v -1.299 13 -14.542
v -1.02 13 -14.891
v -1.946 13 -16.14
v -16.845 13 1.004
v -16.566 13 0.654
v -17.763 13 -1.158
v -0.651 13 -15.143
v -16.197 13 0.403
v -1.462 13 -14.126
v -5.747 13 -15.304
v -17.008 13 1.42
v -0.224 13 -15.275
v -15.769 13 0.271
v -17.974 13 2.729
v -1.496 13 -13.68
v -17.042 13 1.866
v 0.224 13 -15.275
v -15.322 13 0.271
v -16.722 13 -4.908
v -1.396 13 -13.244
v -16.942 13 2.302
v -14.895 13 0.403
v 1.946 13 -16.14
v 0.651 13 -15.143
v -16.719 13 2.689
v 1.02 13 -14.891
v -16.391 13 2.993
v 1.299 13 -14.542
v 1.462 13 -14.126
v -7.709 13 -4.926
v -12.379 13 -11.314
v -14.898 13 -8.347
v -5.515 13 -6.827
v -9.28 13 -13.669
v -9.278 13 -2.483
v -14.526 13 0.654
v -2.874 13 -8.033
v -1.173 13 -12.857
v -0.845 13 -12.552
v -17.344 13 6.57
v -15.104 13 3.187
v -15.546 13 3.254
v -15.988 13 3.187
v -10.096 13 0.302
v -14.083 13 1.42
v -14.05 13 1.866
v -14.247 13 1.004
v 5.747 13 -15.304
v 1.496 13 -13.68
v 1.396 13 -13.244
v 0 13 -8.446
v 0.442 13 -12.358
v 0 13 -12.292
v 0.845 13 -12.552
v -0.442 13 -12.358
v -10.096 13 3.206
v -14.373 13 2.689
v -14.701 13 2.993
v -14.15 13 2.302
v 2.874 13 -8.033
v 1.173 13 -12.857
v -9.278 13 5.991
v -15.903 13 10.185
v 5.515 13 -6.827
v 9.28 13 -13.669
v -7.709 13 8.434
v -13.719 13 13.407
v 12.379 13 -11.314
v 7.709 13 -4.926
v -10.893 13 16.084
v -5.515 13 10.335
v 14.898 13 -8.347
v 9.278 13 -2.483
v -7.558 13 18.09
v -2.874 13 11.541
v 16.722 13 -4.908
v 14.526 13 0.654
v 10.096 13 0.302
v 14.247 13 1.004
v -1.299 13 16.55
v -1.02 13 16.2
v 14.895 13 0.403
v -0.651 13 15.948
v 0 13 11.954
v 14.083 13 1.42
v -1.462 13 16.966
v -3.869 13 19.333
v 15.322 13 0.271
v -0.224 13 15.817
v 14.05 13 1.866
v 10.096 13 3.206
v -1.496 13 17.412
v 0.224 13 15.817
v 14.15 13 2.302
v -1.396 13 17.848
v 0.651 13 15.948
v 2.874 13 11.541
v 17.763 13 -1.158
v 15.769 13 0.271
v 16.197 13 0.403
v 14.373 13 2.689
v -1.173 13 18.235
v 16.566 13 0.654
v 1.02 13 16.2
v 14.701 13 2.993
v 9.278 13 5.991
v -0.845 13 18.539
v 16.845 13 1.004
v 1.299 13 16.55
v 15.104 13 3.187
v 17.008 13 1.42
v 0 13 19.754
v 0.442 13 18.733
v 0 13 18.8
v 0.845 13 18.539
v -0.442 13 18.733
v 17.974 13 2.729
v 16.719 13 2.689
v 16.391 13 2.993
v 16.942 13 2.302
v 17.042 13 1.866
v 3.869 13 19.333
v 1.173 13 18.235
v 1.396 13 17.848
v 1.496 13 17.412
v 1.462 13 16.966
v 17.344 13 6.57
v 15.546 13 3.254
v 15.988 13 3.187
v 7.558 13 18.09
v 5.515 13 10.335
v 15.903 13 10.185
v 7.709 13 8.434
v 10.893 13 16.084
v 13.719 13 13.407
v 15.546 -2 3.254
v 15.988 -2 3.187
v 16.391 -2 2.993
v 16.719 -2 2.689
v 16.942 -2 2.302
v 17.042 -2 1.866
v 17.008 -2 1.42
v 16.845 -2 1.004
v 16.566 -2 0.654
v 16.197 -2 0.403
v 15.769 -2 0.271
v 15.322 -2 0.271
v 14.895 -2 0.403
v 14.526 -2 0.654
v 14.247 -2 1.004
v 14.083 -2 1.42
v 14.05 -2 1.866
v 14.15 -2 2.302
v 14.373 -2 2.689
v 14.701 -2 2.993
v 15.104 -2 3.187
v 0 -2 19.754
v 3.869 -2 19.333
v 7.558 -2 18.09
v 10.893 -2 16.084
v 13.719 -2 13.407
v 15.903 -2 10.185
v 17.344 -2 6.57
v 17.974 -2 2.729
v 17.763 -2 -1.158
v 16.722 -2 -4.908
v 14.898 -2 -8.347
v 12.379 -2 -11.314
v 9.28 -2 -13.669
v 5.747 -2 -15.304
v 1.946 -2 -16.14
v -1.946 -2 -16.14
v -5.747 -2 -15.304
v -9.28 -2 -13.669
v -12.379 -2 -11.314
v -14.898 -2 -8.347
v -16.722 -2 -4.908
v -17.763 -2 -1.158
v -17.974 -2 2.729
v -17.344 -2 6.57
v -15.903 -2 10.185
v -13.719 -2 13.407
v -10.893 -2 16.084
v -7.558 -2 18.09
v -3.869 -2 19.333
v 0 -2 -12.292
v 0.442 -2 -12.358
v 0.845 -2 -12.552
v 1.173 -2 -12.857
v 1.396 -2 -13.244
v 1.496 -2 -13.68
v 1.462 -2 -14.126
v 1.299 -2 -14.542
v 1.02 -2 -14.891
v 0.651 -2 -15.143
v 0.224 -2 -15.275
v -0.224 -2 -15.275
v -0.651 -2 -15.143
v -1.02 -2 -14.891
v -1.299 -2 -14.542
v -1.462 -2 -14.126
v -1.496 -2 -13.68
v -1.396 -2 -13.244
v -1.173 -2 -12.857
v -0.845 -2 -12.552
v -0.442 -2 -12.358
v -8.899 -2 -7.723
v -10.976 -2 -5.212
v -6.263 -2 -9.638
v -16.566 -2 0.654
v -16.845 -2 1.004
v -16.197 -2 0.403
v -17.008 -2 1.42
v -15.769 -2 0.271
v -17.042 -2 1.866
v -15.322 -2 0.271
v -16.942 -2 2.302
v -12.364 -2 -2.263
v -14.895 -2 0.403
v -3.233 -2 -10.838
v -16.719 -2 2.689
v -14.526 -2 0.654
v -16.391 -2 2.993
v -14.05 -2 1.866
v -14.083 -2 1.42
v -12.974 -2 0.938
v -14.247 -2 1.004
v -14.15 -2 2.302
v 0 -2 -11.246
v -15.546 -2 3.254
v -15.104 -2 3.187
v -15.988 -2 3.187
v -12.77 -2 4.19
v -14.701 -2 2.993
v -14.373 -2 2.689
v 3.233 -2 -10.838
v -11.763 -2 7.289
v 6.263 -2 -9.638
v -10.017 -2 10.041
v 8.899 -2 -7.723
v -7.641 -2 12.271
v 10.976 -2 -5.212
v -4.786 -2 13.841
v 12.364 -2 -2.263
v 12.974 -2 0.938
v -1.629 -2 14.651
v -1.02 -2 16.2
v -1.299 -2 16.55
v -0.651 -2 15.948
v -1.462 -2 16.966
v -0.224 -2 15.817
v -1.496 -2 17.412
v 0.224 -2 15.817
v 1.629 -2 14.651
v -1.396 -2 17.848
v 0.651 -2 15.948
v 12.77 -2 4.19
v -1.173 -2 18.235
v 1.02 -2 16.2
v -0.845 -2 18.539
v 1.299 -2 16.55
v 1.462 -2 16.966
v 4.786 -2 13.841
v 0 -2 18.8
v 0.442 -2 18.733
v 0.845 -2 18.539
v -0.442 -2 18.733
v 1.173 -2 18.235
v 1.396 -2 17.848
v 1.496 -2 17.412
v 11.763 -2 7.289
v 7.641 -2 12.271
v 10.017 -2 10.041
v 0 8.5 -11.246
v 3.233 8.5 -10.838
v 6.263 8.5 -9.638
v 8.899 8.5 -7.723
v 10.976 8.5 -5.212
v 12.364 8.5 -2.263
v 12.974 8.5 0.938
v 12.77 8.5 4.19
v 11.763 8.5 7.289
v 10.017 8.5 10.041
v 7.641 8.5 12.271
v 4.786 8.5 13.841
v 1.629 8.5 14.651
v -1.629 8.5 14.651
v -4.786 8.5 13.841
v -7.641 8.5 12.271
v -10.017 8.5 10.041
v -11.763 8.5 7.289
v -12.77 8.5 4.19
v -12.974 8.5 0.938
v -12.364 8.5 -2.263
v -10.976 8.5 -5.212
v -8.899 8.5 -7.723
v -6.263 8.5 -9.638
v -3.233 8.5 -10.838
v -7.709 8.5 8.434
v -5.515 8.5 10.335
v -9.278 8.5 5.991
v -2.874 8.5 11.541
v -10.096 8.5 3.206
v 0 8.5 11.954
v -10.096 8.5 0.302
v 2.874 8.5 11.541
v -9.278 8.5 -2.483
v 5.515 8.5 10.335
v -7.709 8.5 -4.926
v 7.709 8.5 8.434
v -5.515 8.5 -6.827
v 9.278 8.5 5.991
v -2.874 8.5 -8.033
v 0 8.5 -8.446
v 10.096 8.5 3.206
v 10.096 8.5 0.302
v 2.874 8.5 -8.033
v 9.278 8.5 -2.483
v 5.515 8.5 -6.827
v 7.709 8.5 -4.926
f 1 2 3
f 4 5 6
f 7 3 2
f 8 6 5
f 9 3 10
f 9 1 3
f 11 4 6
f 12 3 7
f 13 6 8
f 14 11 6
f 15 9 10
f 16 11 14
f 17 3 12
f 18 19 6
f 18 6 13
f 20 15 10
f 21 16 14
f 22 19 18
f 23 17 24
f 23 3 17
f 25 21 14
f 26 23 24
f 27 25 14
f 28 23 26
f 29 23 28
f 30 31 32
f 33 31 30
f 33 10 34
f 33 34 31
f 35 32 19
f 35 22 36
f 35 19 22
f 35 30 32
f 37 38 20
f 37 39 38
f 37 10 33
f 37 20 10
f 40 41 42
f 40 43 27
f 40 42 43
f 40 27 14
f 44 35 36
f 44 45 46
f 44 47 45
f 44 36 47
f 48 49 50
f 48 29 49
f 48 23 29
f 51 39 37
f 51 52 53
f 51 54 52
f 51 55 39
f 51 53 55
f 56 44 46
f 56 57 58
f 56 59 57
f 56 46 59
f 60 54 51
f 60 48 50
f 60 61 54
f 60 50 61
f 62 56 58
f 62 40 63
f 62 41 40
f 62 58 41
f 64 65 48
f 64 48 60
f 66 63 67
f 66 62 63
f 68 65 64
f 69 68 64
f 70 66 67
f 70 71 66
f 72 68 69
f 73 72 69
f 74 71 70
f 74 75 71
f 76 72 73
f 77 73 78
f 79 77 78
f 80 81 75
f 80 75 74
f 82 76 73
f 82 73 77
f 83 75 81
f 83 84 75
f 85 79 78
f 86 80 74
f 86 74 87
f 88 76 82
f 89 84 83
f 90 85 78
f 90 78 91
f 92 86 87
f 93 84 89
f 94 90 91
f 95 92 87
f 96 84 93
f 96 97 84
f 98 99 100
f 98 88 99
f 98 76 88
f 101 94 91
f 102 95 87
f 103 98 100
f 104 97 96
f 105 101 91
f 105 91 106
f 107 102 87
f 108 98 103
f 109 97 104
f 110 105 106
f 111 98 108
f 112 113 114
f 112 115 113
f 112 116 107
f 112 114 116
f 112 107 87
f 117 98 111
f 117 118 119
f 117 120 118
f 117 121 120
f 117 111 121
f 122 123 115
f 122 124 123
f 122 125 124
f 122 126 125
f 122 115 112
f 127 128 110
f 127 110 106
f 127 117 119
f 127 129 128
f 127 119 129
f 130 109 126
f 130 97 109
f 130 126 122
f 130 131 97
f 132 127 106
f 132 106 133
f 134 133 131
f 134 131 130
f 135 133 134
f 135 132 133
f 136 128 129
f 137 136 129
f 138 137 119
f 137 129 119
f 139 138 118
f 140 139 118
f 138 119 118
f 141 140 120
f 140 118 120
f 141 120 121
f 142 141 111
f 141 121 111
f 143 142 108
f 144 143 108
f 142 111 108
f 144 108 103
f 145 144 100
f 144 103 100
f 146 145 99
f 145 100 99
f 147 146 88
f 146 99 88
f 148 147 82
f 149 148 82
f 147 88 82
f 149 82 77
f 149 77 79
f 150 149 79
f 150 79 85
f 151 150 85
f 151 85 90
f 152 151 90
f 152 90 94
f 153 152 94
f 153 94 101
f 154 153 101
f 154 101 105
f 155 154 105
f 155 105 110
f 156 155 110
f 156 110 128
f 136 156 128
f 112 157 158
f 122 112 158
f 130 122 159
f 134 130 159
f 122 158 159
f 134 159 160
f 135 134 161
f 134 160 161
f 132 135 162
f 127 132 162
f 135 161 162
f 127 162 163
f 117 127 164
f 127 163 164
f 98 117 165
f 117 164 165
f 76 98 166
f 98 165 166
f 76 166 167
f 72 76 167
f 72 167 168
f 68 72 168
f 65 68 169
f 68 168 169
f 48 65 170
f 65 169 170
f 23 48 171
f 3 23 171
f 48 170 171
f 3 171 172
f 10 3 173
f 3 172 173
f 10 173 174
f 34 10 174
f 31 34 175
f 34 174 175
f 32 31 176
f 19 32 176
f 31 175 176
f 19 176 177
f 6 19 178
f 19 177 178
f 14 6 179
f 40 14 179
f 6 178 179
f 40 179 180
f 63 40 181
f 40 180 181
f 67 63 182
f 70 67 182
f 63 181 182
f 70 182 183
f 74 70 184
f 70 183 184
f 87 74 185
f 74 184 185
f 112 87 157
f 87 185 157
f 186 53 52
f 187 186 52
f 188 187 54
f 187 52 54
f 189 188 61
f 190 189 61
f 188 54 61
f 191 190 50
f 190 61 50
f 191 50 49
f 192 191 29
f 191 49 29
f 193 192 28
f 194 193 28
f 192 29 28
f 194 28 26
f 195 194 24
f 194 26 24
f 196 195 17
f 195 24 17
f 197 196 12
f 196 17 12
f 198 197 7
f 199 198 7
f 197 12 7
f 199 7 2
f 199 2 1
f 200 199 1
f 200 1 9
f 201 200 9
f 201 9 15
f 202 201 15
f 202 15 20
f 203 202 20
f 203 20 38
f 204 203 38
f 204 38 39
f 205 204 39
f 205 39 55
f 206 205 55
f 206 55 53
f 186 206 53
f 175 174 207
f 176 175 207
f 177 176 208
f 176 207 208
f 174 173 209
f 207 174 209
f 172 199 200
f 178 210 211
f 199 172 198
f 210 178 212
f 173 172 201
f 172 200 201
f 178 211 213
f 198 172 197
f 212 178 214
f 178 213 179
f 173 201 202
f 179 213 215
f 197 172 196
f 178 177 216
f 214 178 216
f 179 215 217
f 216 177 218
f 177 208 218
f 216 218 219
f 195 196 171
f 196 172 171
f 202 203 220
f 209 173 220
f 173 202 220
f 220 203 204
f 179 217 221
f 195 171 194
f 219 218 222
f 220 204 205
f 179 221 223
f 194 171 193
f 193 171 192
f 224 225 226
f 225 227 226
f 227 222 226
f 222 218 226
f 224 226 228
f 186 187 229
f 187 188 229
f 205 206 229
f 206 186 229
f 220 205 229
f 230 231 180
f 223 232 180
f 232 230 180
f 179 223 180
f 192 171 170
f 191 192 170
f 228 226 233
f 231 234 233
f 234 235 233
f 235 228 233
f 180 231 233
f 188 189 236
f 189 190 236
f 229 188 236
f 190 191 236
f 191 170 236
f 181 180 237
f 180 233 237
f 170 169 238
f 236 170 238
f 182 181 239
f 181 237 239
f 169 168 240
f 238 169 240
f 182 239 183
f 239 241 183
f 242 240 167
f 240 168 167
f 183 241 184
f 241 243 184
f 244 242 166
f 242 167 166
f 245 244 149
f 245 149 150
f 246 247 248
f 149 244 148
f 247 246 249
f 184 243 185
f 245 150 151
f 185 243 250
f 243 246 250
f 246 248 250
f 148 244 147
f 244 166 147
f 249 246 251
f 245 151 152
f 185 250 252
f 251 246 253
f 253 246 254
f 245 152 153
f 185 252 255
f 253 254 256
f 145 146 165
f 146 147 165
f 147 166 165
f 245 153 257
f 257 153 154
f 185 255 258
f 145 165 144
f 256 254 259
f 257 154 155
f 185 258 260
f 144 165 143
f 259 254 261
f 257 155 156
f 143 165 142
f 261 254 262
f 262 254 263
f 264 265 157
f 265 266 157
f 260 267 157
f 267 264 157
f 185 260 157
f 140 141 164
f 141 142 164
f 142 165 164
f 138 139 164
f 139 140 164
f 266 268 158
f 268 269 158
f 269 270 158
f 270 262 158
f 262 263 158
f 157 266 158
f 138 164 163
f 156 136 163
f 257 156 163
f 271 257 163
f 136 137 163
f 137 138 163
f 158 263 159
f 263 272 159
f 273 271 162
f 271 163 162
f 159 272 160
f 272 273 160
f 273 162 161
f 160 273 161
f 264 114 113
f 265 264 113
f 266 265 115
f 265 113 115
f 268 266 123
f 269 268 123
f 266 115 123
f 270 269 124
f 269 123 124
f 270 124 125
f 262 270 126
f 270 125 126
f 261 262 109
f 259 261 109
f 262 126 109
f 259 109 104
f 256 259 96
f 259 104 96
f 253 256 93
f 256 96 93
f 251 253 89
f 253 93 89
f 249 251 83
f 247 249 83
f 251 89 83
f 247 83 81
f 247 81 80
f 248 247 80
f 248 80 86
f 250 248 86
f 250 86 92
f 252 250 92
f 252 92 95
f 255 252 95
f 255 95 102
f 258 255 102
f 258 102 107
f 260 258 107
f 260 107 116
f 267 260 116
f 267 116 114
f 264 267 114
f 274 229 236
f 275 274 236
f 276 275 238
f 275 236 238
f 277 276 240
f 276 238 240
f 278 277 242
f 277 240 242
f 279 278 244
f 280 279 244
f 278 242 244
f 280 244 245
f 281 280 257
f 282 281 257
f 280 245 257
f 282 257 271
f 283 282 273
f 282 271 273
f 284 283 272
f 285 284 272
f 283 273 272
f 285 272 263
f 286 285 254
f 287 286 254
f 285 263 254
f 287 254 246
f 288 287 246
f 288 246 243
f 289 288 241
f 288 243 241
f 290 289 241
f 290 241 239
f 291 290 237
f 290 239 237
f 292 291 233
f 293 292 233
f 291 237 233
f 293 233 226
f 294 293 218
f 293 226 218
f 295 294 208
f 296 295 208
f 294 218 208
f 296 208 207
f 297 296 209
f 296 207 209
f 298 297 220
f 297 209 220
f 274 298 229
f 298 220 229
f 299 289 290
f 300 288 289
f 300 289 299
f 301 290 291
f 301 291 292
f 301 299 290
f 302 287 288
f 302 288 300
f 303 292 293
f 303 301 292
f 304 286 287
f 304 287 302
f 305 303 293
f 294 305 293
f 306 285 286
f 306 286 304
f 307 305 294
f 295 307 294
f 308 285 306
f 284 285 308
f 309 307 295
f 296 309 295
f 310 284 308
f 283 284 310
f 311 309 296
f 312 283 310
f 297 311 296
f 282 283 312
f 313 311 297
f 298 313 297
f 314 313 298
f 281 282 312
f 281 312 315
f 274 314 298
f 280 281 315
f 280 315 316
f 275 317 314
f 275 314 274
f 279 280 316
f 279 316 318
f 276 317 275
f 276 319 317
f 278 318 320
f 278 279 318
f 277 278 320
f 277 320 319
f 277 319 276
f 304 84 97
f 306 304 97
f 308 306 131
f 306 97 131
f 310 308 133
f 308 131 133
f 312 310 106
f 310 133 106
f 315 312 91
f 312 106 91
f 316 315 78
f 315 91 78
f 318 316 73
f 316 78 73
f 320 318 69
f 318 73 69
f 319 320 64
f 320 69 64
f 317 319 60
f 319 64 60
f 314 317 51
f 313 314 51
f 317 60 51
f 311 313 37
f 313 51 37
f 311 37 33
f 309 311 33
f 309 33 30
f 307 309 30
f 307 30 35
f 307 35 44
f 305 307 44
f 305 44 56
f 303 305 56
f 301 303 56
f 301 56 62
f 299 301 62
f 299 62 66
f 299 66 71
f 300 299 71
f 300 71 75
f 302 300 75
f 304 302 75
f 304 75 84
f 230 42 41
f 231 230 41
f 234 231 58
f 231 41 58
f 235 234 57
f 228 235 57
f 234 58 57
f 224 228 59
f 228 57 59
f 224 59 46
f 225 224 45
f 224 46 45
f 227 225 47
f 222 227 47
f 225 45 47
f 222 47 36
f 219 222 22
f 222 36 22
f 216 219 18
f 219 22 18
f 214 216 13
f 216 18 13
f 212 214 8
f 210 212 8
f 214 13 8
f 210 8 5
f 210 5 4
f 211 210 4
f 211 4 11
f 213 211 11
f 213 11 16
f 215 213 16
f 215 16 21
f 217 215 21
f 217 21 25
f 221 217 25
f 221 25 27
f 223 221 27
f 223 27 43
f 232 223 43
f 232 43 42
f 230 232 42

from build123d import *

# Parameters (mm, degrees)
EXTRUDE_START         = -2
SKETCH_1_R            = 18
EXTRUDE_1_DEPTH       = 15
SKETCH_2_R            = 13.000000001
CUT_EXTRUDE_1_DEPTH   = 10.5
SKETCH_3_R            = 10.200000005
CUT_EXTRUDE_2_DEPTH   = 31.64670615
SKETCH_4_R            = 1.5
CUT_EXTRUDE_2_2_DEPTH = 31.64670615


with BuildPart() as part:
    # Эскиз1 → Вытянуть1 (new body)
    with BuildSketch(Plane(origin=(0, 0, 0), x_dir=(1, 0, 0), z_dir=(0, 1, 0)).offset(EXTRUDE_START)):
        with Locations(Location((0, -1.754002071, 0), (0, 0, 270))):
            Circle(SKETCH_1_R)
    extrude(amount=EXTRUDE_1_DEPTH)

    # Эскиз2 → Вырез-Вытянуть1 (cut)
    with BuildSketch(Plane.XZ.offset(2)):
        with Locations(Location((3.8e-08, 1.754001981, 0), (0, 0, 270))):
            Circle(SKETCH_2_R)
    extrude(amount=-CUT_EXTRUDE_1_DEPTH, mode=Mode.SUBTRACT)

    # Эскиз3 → Cut-Extrude 2 (cut, through all)
    with BuildSketch(Plane(origin=(0, 13, 0), x_dir=(1, 0, 0), z_dir=(0, 1, 0))):
        with Locations(Location((3.8e-08, -1.754001981, 0), (0, 0, 270))):
            Circle(SKETCH_3_R)
    extrude(amount=-CUT_EXTRUDE_2_DEPTH, mode=Mode.SUBTRACT)

    # Эскиз4 → Cut-Extrude 2 2 (cut, through all)
    with BuildSketch(Plane(origin=(0, 13, 0), x_dir=(1, 0, 0), z_dir=(0, 1, 0))):
        with Locations(Location((0, 13.791856832, 0), (0, 0, 270))):
            Circle(SKETCH_4_R)
        with Locations(Location((15.545858903, -1.754002071, 0), (0, 0, 270))):
            Circle(SKETCH_4_R)
        with Locations(Location((0, -17.299860974, 0), (0, 0, 270))):
            Circle(SKETCH_4_R)
        with Locations(Location((-15.545858903, -1.754002071, 0), (0, 0, 270))):
            Circle(SKETCH_4_R)
    extrude(amount=-CUT_EXTRUDE_2_2_DEPTH, mode=Mode.SUBTRACT)


solid = part.part
